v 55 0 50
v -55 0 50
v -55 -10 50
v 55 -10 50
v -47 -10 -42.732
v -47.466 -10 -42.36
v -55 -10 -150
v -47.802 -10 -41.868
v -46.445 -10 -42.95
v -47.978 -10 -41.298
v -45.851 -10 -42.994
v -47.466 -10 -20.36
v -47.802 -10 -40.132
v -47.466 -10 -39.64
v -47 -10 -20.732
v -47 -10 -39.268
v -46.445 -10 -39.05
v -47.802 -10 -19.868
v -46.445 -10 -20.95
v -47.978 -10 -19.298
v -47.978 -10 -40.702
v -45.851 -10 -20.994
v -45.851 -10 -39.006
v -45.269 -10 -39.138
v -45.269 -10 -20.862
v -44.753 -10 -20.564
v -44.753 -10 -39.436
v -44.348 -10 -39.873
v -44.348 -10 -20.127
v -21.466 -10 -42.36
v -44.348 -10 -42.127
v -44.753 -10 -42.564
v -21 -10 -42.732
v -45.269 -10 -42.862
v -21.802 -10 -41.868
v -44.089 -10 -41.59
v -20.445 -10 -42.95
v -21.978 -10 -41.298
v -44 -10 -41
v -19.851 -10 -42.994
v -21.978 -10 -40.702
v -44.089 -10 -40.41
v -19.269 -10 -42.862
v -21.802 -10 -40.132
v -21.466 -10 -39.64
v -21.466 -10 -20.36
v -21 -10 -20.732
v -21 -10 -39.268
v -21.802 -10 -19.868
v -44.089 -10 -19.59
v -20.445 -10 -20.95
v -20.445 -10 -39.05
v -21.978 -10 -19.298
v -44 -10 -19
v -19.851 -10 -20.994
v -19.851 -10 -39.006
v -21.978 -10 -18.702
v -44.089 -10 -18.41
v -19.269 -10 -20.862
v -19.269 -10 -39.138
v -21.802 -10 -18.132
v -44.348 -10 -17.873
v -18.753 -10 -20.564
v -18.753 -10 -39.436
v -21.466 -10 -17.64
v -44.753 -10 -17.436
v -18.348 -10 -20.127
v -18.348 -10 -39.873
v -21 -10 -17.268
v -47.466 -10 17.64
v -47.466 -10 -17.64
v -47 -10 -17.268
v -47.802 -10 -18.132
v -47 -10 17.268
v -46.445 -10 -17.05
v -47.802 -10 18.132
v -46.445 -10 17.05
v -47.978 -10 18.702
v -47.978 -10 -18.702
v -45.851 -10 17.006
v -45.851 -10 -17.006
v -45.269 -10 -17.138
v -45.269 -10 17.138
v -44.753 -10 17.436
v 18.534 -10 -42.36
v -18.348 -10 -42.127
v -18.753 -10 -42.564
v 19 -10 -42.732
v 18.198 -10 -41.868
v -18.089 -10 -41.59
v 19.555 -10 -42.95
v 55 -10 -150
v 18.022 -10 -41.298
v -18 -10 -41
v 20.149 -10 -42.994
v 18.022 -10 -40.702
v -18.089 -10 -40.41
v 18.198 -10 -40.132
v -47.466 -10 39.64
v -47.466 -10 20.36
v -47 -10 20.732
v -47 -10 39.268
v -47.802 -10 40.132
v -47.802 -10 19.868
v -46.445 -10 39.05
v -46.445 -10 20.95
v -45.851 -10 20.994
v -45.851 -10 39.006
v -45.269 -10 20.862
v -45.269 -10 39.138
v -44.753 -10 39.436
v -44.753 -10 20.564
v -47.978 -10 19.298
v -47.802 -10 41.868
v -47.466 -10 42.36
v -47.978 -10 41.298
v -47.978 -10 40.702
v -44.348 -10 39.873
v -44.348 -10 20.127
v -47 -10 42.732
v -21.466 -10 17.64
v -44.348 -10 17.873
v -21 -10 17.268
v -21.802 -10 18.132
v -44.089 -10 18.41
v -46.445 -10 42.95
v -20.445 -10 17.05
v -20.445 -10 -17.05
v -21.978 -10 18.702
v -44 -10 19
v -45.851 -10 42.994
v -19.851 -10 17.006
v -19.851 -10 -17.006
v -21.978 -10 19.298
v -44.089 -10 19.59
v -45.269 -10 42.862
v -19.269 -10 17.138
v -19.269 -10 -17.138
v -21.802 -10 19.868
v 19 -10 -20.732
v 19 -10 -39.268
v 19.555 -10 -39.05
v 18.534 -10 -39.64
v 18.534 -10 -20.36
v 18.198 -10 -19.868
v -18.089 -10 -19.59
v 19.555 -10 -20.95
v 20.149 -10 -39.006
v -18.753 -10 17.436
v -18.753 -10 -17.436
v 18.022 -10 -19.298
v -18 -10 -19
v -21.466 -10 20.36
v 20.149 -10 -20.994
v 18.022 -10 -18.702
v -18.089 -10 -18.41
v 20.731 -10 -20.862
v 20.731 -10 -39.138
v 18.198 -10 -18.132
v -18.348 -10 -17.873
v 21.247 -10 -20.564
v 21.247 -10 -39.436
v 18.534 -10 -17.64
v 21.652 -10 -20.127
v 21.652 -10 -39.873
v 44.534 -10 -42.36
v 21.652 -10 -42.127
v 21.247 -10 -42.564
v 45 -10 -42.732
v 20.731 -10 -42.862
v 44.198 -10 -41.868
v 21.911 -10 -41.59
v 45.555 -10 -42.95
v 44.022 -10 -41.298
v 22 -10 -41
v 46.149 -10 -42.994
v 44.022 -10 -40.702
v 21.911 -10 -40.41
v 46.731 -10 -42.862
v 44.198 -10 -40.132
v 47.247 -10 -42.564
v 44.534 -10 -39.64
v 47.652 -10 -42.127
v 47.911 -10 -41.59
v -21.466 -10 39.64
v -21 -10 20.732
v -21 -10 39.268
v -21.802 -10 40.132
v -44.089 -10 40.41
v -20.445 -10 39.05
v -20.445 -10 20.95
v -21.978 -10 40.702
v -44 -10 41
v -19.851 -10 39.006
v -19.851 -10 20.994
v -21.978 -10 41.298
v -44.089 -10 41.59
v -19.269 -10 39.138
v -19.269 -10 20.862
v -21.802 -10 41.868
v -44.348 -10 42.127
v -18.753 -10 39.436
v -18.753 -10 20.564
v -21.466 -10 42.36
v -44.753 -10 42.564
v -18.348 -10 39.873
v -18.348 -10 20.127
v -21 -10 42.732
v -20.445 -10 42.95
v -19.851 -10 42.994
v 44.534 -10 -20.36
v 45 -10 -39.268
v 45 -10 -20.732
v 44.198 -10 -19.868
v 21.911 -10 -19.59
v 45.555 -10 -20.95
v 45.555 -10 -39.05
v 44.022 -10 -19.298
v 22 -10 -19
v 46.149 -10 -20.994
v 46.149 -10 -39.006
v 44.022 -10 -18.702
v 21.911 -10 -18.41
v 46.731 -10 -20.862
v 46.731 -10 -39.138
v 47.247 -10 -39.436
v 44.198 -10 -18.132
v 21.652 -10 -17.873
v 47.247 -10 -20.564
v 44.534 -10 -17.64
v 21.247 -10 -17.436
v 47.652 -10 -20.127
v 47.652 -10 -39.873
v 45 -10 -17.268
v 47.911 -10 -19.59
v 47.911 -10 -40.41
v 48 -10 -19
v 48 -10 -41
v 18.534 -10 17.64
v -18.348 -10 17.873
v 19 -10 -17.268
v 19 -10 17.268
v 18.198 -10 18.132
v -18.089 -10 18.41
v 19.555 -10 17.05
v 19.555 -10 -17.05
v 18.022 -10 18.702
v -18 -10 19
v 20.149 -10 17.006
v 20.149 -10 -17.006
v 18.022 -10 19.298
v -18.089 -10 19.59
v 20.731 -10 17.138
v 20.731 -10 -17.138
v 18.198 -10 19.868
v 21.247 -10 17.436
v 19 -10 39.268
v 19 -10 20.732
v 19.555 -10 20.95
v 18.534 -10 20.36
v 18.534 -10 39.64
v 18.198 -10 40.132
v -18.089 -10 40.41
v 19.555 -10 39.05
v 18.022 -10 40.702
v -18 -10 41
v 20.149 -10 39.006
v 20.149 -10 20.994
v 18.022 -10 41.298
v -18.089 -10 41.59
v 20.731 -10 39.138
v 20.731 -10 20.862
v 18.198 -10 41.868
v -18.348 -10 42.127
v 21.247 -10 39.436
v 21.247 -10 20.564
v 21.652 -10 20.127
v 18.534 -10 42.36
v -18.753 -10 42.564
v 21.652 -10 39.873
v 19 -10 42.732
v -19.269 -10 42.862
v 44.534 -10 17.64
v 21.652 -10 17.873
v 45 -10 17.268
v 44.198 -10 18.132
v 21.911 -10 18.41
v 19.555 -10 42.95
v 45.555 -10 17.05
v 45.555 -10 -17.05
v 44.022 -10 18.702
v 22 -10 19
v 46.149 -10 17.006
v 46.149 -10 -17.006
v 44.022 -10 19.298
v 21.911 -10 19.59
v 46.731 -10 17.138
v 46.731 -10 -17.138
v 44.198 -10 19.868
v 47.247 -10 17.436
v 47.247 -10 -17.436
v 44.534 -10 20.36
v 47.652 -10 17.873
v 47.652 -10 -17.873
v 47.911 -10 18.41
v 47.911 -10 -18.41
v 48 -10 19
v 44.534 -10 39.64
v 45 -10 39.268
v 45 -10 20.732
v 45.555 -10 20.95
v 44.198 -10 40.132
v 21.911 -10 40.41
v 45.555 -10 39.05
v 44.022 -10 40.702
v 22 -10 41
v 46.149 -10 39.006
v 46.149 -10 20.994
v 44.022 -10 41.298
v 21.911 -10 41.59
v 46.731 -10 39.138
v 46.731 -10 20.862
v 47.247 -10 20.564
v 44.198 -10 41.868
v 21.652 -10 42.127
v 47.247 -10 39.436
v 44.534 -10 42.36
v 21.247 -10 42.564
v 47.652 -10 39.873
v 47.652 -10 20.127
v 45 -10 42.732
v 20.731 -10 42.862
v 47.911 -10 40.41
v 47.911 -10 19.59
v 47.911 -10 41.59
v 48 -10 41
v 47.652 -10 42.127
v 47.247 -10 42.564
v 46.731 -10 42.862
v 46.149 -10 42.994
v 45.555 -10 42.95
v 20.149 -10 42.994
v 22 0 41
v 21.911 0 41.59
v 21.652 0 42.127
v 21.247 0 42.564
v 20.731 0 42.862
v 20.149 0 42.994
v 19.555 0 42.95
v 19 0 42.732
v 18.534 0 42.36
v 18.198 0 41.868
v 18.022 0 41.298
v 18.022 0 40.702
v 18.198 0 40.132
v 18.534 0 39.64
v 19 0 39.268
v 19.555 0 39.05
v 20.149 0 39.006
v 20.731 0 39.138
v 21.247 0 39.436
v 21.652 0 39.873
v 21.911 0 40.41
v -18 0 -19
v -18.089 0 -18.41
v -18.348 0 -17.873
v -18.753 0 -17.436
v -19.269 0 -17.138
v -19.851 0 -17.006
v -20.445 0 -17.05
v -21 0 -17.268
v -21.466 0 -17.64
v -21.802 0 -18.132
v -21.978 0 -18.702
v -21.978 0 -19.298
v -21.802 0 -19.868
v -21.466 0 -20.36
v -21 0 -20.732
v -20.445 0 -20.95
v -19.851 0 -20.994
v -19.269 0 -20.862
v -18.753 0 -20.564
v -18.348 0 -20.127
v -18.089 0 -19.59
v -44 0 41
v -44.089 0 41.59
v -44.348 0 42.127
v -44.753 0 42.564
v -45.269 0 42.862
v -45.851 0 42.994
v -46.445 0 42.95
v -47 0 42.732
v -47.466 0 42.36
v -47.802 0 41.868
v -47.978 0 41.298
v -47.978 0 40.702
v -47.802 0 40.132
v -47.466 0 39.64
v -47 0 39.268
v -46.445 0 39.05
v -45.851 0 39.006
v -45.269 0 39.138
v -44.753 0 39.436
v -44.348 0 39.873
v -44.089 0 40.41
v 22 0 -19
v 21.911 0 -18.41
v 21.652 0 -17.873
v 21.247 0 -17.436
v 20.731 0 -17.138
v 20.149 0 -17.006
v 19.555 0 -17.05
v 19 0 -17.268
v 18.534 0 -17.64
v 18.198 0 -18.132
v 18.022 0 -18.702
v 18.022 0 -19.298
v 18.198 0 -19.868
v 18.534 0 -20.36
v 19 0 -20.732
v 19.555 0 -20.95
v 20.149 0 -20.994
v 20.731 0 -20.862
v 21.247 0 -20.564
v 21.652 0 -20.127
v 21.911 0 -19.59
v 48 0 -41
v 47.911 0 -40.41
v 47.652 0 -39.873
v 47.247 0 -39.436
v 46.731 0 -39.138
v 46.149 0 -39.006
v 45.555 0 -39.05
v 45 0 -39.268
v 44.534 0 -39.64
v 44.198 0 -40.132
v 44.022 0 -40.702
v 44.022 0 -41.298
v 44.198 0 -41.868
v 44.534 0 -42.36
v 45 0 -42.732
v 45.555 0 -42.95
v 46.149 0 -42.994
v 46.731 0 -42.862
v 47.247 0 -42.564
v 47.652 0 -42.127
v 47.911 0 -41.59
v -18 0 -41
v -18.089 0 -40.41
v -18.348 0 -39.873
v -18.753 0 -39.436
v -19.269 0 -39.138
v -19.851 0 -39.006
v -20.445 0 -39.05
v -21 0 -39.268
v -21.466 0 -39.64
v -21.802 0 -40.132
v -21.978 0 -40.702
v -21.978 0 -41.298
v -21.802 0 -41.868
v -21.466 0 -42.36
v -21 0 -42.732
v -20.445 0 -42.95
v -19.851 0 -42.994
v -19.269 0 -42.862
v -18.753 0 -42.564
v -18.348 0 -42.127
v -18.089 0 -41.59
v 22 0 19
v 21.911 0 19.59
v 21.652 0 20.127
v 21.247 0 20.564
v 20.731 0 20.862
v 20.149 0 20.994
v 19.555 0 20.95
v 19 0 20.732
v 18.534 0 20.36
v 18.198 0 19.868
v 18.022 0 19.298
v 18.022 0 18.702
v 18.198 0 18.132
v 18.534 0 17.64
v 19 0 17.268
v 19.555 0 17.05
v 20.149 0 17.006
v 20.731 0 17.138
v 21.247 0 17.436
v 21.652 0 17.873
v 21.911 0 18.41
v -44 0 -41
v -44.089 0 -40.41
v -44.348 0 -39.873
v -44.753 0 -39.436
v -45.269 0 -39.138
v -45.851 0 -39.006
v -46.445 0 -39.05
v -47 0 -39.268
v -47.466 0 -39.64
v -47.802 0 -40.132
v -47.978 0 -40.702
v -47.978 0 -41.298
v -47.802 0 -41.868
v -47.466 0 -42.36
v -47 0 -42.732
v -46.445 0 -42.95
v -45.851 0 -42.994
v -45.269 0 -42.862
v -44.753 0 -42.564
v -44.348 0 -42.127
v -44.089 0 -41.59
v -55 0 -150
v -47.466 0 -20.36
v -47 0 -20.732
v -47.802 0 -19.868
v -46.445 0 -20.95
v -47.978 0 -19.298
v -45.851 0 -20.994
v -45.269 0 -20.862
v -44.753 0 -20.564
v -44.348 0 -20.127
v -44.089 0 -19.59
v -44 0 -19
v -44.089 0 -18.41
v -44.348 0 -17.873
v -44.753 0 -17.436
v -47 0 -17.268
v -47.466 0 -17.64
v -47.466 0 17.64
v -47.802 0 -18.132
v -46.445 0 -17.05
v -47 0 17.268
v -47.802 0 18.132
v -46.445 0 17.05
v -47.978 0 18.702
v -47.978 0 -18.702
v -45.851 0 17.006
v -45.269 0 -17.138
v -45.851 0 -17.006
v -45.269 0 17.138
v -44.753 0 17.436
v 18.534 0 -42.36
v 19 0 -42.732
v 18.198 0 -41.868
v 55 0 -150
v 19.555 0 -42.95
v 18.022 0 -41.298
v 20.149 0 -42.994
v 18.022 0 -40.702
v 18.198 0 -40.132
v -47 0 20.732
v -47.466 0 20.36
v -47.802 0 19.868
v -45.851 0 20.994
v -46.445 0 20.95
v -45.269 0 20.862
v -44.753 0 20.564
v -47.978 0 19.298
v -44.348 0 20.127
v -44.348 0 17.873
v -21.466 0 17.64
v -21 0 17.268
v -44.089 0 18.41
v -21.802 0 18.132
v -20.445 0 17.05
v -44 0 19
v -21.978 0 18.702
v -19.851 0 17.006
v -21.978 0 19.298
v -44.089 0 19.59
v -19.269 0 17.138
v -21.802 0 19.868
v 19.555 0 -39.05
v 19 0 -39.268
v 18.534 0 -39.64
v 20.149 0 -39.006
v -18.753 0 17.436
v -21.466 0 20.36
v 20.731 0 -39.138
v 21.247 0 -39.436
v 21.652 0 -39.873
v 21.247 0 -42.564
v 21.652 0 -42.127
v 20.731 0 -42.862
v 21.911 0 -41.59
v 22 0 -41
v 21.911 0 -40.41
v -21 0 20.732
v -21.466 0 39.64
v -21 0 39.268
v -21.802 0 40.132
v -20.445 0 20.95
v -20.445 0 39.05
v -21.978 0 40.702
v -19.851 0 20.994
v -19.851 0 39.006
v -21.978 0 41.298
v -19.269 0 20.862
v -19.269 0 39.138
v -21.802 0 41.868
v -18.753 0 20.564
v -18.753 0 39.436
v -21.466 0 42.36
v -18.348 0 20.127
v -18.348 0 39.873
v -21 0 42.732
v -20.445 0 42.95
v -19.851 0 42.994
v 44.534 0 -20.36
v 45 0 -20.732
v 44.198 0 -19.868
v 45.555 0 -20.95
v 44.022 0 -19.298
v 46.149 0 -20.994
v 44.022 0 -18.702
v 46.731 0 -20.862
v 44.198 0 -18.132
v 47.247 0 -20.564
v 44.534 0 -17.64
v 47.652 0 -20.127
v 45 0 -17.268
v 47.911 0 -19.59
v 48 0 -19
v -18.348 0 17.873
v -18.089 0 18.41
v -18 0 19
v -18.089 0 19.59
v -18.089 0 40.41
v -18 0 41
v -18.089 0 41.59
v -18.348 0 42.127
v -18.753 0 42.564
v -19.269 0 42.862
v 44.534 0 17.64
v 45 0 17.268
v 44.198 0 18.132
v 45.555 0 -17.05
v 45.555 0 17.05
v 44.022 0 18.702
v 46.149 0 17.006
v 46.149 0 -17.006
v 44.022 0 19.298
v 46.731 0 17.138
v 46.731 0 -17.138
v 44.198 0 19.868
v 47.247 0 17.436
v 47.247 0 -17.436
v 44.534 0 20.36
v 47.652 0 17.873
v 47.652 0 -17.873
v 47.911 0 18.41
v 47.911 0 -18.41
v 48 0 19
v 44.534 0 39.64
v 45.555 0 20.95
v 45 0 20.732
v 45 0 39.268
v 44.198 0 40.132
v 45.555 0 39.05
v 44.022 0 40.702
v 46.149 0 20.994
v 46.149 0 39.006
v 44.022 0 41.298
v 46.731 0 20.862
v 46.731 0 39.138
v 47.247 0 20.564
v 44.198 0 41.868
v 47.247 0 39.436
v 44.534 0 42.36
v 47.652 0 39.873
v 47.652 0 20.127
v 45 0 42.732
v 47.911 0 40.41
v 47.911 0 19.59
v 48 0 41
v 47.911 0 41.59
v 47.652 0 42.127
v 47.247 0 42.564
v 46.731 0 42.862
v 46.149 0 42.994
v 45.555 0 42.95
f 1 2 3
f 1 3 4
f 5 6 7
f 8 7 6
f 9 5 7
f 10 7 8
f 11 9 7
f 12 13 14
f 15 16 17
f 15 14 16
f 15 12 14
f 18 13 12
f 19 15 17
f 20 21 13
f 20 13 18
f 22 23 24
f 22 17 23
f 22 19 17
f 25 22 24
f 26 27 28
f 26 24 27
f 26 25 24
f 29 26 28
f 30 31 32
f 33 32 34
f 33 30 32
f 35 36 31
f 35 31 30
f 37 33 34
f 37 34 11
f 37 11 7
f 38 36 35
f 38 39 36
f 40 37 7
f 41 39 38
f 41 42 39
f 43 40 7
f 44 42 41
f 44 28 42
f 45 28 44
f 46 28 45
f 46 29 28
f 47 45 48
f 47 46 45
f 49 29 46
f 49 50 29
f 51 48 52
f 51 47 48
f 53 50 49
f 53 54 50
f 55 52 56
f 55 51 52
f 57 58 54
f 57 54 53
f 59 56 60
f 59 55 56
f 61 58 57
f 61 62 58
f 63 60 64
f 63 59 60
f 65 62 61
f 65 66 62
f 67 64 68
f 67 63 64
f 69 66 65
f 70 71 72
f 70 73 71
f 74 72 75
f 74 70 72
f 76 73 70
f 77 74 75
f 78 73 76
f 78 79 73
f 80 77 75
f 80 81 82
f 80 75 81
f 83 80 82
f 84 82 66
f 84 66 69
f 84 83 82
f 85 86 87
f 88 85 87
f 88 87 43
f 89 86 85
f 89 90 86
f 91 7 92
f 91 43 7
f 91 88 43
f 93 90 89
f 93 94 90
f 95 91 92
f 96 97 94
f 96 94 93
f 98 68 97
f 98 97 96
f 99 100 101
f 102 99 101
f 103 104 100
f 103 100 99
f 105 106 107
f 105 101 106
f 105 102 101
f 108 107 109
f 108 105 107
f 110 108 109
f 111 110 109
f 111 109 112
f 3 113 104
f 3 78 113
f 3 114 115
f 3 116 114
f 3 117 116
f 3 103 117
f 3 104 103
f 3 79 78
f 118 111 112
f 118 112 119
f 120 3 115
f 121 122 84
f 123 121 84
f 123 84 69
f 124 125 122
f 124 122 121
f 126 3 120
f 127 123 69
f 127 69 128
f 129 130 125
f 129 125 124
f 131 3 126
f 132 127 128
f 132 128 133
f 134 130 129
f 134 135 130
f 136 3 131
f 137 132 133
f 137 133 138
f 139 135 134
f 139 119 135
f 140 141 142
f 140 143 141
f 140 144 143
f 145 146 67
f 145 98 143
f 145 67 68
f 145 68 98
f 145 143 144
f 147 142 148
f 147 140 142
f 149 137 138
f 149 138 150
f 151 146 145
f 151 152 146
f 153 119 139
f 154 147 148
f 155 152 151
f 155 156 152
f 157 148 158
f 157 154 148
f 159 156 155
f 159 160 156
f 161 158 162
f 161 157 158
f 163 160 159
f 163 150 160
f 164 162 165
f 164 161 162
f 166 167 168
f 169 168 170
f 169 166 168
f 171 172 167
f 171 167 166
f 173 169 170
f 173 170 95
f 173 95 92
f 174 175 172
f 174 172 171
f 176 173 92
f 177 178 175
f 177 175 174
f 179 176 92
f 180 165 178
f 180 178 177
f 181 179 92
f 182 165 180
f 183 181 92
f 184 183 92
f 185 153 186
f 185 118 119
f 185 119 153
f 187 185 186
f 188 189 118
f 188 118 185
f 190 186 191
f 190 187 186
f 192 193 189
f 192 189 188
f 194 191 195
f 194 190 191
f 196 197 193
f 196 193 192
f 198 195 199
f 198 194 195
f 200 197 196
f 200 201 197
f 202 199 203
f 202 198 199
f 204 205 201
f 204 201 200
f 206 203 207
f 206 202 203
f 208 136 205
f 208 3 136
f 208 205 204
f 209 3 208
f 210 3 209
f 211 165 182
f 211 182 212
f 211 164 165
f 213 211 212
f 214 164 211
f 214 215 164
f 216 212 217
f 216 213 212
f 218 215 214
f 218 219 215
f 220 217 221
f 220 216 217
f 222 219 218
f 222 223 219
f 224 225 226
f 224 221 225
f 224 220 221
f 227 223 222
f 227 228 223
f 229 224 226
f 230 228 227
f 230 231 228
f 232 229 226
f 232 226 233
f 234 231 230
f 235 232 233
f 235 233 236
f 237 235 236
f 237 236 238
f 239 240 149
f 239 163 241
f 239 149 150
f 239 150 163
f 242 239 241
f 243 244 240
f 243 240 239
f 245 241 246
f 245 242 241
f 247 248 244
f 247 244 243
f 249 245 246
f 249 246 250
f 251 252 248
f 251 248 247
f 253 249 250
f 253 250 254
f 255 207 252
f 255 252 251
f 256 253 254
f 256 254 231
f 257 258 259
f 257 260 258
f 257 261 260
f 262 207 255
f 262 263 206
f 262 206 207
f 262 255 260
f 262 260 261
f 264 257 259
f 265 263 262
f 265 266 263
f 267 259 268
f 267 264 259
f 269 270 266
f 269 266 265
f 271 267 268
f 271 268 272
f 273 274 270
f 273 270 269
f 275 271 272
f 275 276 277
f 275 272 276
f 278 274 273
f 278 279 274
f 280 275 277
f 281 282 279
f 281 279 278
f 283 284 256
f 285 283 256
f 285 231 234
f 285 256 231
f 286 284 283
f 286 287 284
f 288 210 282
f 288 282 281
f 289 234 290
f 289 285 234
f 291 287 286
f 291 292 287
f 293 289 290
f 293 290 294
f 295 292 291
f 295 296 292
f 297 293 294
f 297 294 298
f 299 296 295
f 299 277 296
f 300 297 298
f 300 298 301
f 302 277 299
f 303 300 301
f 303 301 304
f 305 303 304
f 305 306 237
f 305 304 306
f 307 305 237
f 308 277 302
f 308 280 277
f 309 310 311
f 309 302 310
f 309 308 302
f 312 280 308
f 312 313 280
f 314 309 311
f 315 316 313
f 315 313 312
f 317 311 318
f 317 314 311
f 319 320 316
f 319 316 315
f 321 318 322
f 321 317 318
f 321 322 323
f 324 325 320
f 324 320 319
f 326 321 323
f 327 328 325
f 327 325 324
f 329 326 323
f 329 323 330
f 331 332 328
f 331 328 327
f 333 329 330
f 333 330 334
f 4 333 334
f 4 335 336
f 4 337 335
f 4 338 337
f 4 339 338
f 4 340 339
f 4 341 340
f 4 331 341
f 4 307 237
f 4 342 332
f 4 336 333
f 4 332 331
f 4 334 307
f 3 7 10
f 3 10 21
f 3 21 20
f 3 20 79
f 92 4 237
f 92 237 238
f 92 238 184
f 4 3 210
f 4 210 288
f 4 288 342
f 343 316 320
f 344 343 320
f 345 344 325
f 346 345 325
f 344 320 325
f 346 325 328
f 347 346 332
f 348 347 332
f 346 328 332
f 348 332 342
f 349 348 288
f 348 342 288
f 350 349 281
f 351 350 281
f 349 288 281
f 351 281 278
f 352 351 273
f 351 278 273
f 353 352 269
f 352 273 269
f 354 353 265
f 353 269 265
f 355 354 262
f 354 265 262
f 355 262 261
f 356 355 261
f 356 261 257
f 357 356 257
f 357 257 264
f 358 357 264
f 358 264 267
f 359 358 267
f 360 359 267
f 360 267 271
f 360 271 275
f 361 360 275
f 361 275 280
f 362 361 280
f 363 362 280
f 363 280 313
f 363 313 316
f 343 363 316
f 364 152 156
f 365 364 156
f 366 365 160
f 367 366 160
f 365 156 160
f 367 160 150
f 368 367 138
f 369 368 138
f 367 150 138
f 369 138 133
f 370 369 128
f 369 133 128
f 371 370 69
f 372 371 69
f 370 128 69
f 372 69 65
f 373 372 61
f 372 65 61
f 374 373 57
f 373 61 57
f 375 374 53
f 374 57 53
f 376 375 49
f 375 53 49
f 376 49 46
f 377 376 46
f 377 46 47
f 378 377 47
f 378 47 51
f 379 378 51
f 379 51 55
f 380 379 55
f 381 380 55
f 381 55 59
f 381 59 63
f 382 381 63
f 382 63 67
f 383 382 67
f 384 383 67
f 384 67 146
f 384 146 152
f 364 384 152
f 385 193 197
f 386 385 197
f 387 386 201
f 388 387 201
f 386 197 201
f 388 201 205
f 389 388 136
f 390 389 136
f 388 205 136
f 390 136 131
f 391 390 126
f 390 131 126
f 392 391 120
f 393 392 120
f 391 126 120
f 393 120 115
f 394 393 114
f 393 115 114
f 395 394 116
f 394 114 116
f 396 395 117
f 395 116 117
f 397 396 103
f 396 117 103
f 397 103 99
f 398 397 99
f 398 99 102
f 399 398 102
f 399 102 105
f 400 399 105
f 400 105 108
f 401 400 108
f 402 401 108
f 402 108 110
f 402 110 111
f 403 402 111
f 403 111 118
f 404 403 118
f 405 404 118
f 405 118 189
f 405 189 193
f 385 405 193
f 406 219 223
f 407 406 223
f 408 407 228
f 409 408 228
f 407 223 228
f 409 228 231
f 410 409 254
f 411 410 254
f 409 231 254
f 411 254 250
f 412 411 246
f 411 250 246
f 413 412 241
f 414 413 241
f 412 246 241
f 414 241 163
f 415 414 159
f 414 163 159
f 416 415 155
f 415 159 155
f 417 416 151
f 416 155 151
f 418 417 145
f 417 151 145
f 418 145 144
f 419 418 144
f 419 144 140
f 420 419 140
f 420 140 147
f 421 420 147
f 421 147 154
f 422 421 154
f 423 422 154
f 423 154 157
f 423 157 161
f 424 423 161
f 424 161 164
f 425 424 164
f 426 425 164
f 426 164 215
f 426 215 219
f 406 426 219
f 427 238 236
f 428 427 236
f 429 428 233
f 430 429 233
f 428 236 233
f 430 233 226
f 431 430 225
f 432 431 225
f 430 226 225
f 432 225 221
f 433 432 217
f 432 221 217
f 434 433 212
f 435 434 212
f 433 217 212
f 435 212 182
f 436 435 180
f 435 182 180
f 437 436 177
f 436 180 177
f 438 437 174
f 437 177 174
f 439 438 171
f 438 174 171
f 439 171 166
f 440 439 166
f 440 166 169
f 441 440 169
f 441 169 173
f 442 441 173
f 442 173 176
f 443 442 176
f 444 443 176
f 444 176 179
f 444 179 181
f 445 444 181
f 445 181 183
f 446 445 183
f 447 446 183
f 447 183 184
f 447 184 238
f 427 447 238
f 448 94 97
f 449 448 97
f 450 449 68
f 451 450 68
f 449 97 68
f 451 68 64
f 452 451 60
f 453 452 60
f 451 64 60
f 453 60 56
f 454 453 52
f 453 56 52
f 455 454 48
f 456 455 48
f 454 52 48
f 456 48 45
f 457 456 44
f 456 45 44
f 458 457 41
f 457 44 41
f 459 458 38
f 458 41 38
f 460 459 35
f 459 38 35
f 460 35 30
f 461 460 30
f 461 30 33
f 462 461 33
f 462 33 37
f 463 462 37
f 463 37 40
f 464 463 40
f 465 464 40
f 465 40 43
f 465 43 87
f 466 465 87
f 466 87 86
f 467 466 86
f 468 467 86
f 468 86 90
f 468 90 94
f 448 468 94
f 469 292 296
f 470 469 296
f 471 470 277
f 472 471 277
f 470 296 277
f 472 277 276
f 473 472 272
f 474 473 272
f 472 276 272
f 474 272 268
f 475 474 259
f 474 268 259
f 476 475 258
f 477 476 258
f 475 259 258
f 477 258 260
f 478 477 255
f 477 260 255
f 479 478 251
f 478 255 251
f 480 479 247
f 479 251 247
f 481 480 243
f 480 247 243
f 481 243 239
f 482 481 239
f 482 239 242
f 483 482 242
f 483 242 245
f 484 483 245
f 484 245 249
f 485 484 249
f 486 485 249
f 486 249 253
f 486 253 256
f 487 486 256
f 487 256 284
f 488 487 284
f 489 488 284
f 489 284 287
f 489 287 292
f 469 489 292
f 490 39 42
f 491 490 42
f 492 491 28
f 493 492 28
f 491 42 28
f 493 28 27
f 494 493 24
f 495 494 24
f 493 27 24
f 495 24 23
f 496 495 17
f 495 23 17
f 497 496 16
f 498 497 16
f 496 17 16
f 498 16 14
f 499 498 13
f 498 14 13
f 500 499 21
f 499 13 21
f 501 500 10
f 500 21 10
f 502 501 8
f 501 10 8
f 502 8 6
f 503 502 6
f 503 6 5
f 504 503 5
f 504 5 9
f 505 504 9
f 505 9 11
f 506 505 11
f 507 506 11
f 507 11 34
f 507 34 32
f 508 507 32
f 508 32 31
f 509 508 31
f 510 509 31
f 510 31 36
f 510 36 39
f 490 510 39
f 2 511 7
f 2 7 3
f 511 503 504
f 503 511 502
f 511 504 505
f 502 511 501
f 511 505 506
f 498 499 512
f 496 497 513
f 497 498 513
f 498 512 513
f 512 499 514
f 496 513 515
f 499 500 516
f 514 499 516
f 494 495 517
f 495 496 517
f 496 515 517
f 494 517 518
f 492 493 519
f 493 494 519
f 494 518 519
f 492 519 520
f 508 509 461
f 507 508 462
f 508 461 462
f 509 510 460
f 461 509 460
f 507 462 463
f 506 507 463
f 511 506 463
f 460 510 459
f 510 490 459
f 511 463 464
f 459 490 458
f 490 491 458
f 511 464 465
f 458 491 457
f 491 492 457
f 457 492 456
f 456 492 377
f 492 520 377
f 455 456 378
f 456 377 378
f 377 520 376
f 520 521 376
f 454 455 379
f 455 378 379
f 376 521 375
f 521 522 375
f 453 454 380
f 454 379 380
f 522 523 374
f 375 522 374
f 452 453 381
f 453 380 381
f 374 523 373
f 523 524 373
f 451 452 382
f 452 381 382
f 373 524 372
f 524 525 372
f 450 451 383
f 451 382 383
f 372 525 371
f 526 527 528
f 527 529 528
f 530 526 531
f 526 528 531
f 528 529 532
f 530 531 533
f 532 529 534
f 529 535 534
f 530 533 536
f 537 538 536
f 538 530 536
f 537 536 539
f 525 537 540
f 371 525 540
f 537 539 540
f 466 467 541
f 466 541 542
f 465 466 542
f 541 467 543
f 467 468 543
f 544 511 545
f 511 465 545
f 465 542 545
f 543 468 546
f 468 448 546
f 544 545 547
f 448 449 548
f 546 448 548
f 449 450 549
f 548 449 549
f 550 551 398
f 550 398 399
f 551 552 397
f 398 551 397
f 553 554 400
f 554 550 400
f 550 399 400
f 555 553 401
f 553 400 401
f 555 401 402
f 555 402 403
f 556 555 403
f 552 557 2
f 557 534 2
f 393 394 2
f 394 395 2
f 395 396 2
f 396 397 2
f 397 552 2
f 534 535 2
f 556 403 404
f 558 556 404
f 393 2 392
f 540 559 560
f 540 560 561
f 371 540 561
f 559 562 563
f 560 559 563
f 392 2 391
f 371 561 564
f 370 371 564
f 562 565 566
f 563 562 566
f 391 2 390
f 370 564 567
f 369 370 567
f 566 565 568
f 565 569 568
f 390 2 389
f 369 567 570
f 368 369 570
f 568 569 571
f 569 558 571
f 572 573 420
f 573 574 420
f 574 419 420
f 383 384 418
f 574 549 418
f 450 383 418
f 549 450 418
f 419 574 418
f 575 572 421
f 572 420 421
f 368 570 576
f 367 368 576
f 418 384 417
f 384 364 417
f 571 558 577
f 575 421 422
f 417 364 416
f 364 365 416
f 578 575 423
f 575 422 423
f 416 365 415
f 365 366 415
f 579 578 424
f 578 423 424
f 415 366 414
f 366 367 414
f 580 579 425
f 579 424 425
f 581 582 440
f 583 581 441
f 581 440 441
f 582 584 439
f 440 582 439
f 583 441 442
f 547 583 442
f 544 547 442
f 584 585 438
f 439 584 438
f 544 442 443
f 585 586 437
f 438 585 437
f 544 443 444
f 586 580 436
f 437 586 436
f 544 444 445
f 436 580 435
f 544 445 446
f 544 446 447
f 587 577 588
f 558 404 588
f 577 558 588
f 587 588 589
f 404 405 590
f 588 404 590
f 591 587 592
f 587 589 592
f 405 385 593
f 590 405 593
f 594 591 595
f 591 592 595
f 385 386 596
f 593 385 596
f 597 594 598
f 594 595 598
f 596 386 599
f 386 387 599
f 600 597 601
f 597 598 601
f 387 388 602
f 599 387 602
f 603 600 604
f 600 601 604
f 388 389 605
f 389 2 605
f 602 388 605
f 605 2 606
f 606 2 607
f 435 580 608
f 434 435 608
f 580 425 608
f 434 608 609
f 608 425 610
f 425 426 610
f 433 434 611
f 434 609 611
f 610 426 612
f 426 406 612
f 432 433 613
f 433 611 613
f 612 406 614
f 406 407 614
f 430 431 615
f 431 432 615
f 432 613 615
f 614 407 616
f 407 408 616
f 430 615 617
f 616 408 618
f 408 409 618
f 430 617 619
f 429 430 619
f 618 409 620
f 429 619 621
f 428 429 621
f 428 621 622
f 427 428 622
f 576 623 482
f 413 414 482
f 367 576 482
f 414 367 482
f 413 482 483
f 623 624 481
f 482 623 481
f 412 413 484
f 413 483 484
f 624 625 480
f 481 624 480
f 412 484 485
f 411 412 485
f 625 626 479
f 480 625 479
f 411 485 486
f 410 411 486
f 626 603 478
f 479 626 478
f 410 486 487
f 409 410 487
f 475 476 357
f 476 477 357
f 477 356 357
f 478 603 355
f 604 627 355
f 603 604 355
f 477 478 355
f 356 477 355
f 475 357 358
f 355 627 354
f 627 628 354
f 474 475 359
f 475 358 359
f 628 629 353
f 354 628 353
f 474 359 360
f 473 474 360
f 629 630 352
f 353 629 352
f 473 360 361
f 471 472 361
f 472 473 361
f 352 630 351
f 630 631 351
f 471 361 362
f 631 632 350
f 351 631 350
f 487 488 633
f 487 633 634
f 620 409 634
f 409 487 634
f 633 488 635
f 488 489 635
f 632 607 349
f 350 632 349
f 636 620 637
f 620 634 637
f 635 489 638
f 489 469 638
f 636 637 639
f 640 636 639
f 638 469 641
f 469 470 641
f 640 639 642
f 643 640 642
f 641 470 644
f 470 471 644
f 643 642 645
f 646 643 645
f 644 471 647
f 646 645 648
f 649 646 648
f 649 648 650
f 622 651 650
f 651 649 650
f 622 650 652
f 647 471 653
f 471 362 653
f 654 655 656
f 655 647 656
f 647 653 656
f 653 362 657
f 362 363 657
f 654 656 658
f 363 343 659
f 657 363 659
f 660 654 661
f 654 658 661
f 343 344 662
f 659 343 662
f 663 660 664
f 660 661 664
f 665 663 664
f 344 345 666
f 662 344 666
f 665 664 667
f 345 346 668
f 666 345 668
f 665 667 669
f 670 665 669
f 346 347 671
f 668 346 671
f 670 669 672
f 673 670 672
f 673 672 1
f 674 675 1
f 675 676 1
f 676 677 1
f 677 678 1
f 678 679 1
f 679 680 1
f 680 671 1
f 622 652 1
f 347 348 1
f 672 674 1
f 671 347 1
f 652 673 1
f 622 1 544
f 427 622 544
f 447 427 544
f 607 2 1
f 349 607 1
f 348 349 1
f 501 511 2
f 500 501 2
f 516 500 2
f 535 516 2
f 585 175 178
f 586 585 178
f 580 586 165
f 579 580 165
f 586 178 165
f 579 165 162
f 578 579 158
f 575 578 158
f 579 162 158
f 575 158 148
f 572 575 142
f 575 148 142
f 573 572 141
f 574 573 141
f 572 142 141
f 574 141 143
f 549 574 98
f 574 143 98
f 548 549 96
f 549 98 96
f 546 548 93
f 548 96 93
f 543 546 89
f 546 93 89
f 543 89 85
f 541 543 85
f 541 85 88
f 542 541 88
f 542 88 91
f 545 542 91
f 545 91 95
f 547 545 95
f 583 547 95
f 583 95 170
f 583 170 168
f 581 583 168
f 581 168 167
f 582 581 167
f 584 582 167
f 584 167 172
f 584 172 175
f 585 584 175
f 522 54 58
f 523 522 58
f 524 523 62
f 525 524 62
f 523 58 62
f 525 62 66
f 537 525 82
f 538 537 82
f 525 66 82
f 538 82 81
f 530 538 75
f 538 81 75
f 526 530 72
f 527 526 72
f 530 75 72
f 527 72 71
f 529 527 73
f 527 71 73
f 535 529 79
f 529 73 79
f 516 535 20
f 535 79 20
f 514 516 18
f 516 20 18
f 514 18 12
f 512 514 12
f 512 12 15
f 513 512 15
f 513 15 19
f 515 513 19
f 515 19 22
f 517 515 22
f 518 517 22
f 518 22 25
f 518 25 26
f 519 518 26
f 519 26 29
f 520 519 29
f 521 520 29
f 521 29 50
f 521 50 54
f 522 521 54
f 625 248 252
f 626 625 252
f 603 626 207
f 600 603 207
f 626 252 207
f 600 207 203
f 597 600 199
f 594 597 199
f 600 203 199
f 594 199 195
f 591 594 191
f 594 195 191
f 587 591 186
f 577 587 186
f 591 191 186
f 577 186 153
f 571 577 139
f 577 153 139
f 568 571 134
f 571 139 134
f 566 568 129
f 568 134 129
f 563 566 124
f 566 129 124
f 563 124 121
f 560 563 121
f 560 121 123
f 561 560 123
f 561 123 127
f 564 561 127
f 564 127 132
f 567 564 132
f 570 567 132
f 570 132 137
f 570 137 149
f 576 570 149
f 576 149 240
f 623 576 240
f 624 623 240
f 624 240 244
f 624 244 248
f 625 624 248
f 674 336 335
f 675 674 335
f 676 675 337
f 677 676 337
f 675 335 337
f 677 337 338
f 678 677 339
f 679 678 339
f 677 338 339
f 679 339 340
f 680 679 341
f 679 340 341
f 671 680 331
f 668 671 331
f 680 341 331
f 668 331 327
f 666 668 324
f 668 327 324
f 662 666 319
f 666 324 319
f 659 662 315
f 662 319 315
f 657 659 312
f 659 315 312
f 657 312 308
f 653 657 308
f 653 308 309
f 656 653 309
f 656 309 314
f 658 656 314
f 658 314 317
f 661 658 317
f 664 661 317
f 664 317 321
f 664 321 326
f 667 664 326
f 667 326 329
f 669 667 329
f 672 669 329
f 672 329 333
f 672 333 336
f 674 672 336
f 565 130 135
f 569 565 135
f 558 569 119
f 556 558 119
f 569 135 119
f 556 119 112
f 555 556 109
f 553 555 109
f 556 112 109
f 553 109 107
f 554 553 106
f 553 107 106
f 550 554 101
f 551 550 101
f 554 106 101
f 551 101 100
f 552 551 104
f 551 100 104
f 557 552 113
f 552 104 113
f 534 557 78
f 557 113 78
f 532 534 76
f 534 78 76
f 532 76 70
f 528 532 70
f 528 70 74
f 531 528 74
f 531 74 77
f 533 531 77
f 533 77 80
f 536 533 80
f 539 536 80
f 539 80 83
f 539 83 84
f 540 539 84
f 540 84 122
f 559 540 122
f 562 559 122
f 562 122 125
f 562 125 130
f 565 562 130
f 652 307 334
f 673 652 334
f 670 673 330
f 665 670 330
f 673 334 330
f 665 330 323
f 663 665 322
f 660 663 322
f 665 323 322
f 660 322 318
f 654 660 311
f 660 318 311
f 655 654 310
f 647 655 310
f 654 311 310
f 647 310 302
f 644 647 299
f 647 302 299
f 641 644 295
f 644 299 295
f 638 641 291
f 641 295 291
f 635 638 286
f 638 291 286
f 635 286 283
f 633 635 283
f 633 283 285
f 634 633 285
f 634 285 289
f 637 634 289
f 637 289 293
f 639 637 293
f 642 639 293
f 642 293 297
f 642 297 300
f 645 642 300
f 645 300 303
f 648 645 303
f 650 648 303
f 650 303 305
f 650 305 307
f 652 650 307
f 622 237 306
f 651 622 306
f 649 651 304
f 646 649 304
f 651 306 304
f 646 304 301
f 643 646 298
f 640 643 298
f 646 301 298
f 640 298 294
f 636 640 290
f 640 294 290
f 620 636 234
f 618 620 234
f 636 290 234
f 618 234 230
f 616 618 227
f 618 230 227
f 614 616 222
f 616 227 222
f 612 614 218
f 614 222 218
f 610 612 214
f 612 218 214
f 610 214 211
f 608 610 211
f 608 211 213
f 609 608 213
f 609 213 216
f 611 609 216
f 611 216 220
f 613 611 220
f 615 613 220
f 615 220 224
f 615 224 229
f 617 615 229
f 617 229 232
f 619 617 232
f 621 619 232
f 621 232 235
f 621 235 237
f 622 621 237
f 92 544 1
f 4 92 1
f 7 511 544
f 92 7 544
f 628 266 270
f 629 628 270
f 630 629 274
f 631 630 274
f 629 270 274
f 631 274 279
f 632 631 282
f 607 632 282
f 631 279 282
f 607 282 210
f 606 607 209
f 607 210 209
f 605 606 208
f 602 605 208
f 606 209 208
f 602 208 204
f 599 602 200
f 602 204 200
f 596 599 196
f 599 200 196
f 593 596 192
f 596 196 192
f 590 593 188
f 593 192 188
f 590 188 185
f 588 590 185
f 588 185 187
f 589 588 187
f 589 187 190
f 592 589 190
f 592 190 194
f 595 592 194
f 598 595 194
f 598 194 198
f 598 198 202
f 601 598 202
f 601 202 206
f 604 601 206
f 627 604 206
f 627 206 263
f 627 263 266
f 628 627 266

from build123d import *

# Parameters (mm, degrees)
F0_W     = 110
F0_H     = 100
F1_DEPTH = 10
F2_R     = 2
F3_DEPTH = 25
F4_W     = 110
F4_H     = 100
F5_DEPTH = 10


with BuildPart() as f1:
    # F0 (on Front) → F1 (new body)
    with BuildSketch(Plane.XZ):
        Rectangle(F0_W, F0_H)
    extrude(amount=F1_DEPTH)

    # F2 (on face) → F3 (cut)
    with BuildSketch(Plane.XZ.offset(10)):
        with Locations((-46, 41)):
            Circle(F2_R)
        with Locations((-20, 41)):
            Circle(F2_R)
        with Locations((-46, 19)):
            Circle(F2_R)
        with Locations((-20, 19)):
            Circle(F2_R)
        with Locations((46, 41)):
            Circle(F2_R)
        with Locations((20, 41)):
            Circle(F2_R)
        with Locations((20, 19)):
            Circle(F2_R)
        with Locations((46, 19)):
            Circle(F2_R)
        with Locations((-46, -19)):
            Circle(F2_R)
        with Locations((-46, -41)):
            Circle(F2_R)
        with Locations((-20, -19)):
            Circle(F2_R)
        with Locations((-20, -41)):
            Circle(F2_R)
        with Locations((20, -41)):
            Circle(F2_R)
        with Locations((46, -41)):
            Circle(F2_R)
        with Locations((46, -19)):
            Circle(F2_R)
        with Locations((20, -19)):
            Circle(F2_R)
    extrude(amount=-F3_DEPTH, mode=Mode.SUBTRACT)

    # F4 (on Front) → F5 (join)
    with BuildSketch(Plane.XZ):
        with Locations((0, -100)):
            Rectangle(F4_W, F4_H)
    extrude(amount=F5_DEPTH)


solid = f1.part
